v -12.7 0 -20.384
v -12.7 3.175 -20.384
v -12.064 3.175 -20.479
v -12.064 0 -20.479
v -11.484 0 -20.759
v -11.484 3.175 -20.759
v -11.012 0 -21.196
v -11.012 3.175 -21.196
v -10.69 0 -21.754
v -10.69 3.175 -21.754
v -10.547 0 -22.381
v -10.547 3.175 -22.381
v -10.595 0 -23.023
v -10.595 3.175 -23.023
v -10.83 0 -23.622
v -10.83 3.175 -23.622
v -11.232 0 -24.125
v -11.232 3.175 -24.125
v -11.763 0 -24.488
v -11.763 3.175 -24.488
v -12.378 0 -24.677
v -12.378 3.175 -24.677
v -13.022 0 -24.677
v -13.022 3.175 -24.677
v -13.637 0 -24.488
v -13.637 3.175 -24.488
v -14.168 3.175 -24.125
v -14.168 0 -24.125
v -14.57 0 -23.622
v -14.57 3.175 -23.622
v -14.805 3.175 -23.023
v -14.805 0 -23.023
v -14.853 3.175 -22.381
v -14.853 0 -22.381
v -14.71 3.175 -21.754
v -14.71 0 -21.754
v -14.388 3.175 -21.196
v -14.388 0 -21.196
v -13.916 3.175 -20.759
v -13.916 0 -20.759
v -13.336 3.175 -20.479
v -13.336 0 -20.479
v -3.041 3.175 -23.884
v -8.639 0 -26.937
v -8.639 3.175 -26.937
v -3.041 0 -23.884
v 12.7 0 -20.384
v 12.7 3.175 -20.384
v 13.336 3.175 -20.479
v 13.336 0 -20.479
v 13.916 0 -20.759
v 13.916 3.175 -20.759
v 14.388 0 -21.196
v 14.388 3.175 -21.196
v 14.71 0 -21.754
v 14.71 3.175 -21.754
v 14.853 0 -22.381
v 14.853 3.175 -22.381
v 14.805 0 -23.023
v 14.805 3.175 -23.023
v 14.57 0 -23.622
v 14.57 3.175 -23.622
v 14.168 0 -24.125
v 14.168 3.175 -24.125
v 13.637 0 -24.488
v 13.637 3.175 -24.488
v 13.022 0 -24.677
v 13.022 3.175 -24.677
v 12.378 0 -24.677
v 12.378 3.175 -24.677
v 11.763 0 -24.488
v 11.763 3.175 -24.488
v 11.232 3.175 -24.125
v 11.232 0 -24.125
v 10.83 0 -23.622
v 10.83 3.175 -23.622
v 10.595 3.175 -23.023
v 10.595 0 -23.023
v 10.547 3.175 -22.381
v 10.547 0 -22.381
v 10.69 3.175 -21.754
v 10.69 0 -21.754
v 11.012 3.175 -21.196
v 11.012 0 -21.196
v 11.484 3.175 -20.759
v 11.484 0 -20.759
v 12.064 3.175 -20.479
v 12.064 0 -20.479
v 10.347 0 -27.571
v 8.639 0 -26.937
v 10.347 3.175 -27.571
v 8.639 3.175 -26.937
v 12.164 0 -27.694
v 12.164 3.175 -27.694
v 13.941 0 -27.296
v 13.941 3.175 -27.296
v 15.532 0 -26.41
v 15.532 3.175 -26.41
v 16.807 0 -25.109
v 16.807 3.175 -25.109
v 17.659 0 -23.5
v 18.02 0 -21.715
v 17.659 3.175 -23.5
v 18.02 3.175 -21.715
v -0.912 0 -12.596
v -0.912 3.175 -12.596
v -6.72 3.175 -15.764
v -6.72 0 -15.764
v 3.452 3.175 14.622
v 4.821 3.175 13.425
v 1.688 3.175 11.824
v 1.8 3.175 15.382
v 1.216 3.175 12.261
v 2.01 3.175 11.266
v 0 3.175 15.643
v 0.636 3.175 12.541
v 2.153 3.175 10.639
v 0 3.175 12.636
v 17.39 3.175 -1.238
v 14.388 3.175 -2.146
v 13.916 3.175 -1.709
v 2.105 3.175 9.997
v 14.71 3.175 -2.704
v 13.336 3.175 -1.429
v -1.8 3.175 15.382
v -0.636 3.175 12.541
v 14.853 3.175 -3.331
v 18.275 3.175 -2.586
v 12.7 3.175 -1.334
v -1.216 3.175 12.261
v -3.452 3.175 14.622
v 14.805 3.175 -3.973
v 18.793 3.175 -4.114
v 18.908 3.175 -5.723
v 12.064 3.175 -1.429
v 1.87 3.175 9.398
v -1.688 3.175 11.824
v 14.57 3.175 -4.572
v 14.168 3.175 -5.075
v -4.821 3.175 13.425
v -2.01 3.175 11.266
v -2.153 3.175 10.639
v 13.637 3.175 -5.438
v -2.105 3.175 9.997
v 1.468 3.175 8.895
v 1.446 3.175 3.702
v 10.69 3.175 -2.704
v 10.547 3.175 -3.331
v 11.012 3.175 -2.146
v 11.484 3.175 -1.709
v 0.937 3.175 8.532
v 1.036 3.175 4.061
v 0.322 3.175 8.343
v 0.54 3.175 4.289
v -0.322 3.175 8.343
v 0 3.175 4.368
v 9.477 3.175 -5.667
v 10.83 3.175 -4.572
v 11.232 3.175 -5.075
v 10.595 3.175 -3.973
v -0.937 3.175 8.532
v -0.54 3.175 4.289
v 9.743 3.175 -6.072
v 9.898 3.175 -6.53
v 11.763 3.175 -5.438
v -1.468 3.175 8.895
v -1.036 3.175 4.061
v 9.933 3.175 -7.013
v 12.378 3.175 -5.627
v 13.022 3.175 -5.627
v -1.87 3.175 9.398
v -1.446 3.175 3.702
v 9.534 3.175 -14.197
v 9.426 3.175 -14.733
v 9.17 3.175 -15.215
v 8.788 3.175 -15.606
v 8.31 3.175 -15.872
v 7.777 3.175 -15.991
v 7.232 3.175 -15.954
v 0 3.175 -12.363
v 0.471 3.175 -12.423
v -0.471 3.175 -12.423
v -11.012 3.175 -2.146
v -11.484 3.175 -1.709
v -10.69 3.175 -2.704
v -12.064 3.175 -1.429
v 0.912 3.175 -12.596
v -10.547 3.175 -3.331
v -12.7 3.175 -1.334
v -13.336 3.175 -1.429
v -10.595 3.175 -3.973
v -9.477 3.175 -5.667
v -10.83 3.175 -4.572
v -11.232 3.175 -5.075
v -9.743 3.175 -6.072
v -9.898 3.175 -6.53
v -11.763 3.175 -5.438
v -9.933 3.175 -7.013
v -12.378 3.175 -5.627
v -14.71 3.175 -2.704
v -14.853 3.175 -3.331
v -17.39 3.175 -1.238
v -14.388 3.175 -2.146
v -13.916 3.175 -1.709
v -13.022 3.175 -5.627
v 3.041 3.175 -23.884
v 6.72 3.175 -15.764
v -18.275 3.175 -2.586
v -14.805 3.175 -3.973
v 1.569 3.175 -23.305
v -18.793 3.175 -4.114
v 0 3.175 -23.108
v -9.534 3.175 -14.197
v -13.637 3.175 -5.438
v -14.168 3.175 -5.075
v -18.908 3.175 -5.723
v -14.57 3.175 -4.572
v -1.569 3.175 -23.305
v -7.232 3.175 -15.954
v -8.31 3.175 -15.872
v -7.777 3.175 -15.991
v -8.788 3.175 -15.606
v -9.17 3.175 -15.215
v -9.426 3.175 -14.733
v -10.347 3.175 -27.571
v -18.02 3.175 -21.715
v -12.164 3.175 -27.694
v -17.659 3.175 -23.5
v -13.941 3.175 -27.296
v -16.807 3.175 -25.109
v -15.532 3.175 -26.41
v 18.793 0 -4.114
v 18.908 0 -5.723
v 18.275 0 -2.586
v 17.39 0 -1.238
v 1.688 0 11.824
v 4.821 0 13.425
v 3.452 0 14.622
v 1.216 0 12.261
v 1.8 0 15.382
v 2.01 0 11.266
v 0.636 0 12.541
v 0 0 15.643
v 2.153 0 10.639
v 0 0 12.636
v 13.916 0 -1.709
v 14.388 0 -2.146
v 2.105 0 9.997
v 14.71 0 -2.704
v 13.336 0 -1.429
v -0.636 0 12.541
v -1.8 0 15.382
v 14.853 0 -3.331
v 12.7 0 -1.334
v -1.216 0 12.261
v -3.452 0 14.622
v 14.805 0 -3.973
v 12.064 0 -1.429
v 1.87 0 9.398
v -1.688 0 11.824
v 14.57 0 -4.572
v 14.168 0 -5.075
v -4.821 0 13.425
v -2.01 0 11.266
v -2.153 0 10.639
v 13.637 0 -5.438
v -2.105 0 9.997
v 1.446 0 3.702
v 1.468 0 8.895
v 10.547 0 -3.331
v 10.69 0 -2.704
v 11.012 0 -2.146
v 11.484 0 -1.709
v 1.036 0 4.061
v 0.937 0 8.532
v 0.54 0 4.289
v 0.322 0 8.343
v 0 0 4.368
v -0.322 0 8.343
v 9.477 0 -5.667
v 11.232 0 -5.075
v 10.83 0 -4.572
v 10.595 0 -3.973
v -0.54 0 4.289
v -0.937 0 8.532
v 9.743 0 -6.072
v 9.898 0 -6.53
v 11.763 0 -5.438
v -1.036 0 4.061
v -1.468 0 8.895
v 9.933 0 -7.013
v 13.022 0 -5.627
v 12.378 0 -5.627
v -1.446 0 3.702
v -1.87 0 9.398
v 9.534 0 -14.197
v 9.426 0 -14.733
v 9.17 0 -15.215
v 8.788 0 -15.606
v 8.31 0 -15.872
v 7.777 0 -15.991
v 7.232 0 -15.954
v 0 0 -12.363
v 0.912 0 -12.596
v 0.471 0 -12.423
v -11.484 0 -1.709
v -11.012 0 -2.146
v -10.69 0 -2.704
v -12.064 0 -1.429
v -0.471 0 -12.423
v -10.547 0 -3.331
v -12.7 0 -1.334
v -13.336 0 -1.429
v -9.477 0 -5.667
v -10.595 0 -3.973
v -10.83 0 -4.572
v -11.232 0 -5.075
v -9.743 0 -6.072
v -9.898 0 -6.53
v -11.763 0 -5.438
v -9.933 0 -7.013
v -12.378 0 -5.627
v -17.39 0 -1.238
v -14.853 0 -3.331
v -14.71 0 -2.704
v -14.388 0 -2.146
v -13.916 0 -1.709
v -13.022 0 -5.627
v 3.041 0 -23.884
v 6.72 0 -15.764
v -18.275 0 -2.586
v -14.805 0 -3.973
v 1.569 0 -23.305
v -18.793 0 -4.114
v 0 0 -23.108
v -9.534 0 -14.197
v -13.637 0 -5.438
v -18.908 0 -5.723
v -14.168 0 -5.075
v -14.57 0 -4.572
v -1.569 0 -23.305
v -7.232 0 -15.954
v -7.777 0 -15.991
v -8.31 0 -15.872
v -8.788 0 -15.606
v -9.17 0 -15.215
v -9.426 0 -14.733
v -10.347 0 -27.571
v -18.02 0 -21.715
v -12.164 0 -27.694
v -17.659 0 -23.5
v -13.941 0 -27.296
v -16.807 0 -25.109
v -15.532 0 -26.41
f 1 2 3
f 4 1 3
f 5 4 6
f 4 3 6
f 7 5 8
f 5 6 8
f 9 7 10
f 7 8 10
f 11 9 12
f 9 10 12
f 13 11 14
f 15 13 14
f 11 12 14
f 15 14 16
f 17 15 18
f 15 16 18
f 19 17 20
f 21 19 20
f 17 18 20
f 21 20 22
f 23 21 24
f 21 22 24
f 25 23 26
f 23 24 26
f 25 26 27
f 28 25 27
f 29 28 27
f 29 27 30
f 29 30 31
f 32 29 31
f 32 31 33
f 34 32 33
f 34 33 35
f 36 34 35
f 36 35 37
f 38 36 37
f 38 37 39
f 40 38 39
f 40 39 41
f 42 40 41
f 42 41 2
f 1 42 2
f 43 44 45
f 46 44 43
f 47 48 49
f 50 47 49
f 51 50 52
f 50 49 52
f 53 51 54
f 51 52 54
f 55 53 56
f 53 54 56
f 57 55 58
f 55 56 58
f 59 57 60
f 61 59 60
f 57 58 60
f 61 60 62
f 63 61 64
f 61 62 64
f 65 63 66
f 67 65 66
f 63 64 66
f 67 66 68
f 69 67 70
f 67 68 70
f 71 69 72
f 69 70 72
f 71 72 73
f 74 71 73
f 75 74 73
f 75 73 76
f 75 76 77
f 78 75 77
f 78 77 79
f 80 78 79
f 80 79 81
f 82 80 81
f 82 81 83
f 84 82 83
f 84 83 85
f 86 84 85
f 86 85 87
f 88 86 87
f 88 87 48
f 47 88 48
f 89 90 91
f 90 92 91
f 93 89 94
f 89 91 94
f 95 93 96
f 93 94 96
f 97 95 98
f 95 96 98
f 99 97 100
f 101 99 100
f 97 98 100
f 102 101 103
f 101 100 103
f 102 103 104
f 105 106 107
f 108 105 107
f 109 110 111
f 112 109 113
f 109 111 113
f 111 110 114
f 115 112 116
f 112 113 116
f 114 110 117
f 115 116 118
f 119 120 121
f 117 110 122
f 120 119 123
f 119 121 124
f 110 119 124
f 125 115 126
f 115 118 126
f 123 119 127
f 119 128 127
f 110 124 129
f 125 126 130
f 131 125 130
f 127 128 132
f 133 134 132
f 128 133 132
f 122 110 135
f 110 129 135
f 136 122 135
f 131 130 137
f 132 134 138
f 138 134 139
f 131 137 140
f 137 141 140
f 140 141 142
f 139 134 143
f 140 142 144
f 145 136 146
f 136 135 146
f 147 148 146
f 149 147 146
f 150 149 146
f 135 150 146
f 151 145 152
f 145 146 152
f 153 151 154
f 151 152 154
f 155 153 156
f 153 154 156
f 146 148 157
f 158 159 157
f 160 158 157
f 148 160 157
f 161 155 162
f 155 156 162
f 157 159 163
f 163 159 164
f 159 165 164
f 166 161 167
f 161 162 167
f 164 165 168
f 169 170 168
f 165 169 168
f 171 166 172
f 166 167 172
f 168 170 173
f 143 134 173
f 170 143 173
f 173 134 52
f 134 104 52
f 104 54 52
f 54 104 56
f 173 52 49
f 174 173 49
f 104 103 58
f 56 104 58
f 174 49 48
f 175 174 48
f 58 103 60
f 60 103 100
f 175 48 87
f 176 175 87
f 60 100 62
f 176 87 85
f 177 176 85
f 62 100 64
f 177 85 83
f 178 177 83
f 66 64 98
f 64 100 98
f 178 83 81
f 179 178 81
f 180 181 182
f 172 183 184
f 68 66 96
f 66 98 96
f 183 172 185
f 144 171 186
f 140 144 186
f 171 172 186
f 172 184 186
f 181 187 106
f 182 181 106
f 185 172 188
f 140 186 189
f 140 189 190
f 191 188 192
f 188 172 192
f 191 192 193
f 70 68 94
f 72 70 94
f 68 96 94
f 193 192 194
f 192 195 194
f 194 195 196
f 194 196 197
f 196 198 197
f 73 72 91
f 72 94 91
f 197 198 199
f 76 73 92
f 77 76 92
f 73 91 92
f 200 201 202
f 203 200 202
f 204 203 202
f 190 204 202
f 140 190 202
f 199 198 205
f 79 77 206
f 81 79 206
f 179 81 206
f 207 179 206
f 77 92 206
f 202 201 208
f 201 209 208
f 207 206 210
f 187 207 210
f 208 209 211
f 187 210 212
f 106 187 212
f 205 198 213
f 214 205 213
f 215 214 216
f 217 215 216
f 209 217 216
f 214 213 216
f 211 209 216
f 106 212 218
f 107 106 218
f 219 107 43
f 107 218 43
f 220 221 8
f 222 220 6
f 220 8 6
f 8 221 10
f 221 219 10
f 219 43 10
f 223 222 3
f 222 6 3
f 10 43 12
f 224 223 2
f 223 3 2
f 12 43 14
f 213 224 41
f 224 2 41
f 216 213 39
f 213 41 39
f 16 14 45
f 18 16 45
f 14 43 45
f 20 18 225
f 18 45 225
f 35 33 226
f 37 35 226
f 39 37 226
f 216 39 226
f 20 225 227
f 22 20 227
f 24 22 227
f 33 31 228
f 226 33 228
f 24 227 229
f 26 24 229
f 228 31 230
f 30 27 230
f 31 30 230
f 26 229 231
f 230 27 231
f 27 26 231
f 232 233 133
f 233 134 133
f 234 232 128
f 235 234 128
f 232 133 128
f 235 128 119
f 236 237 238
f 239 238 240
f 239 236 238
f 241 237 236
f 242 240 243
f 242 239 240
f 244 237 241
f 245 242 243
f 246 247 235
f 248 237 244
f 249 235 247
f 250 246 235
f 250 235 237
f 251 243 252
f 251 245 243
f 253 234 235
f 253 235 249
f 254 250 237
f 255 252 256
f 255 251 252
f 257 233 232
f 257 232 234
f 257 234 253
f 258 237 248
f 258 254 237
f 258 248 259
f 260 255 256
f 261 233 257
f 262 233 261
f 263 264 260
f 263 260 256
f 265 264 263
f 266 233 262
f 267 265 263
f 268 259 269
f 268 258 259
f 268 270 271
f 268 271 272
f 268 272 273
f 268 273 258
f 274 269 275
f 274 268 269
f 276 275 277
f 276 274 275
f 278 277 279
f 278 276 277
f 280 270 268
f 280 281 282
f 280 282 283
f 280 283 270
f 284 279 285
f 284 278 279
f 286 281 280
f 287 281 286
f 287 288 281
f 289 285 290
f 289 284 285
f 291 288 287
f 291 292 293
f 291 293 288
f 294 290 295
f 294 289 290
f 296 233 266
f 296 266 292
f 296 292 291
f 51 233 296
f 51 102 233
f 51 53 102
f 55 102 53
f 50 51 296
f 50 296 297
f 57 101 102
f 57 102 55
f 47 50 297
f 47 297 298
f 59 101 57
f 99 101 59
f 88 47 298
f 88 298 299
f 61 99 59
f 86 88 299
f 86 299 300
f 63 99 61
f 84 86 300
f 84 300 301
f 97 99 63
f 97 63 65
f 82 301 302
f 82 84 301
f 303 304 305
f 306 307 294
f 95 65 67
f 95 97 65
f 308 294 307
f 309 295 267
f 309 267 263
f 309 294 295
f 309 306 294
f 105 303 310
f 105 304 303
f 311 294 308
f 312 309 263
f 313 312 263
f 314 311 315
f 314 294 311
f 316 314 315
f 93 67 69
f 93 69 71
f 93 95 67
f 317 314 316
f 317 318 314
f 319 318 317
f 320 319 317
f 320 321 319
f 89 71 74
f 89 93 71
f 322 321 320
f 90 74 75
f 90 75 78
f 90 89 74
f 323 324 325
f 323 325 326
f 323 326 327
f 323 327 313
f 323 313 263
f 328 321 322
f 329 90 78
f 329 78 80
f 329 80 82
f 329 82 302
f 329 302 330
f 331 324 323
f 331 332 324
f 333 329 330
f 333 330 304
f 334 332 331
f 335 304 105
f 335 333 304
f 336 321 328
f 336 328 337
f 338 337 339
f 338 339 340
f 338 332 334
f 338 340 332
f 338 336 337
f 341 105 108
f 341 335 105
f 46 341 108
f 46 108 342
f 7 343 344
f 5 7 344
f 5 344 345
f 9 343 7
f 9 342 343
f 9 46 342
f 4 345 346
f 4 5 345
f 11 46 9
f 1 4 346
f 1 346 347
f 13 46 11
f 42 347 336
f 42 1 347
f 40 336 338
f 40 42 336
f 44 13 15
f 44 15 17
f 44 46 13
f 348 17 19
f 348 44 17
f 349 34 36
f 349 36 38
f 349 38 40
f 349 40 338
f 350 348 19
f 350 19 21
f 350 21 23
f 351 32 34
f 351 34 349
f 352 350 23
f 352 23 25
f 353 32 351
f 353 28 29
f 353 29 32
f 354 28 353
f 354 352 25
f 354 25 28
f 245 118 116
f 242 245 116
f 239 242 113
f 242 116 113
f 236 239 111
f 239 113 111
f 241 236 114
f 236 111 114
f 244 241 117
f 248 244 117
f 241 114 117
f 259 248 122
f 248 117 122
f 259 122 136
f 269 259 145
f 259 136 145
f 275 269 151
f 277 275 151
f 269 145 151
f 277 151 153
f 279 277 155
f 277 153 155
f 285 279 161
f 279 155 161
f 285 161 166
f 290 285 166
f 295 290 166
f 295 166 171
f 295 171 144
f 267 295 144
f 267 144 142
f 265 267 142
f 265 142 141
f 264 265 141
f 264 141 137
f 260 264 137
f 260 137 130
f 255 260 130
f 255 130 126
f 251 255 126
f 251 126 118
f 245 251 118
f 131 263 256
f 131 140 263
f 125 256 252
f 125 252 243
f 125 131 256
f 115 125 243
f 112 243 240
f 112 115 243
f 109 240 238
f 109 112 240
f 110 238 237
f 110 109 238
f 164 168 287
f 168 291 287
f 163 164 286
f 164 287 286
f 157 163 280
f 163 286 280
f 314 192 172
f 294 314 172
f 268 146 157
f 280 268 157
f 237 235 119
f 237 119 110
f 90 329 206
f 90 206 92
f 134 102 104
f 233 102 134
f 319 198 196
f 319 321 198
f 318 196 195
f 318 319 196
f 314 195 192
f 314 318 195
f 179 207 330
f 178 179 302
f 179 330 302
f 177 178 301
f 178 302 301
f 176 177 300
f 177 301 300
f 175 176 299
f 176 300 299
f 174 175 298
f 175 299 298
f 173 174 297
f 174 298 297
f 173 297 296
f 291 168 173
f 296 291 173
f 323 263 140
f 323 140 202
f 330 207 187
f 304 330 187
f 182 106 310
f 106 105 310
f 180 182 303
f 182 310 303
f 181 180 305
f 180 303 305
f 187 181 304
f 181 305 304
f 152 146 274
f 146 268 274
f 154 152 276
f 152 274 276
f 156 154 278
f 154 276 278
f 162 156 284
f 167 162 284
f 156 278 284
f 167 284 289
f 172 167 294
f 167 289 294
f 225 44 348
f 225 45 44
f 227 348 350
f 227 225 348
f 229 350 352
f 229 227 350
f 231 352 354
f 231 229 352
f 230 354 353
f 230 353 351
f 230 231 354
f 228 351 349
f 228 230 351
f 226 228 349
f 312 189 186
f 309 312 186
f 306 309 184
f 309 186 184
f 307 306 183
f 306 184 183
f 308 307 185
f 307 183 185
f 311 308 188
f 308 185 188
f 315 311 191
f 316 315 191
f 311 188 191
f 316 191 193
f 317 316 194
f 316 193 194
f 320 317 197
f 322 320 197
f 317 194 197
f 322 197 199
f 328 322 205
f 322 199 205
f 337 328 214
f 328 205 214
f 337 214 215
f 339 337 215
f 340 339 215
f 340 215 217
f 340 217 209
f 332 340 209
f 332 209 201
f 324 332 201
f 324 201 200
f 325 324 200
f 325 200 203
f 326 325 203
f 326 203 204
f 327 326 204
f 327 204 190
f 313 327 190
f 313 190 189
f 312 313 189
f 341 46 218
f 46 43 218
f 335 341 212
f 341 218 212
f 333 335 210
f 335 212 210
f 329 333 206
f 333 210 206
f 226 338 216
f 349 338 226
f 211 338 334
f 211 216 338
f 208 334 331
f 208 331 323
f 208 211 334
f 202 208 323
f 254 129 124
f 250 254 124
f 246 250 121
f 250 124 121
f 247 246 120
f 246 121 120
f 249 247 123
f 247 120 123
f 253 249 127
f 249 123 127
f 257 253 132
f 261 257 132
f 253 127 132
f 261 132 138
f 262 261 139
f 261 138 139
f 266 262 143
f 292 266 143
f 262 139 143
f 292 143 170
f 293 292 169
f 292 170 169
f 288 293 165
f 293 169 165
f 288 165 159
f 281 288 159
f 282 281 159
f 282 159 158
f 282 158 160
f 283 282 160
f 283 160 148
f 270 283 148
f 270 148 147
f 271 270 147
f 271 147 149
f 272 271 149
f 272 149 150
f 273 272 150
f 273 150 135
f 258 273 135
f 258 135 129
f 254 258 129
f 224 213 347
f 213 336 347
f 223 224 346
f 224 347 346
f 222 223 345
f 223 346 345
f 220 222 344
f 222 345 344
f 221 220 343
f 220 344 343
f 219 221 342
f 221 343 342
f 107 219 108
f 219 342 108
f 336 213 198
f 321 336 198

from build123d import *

# Parameters (mm, degrees)
BOSS_EXTRUDE1_DEPTH = 3.175
SKETCH2_R           = 2.159
CUT_EXTRUDE1_DEPTH  = 38.162422217
CUT_EXTRUDE2_DEPTH  = 38.162422217
FILLET1_R           = 6.35
FILLET2_R           = 1.905


with BuildPart() as part:
    # Sketch1 → Boss-Extrude1 (new body)
    with BuildSketch(Plane(origin=(0, 0, 0), x_dir=(1, 0, 0), z_dir=(0, 1, 0))):
        Polygon((-17.4625, 31.75), (0, 22.225), (17.4625, 31.75), (19.05, 3.175), (0, -19.05), (-19.05, 3.175), align=None)
    extrude(amount=BOSS_EXTRUDE1_DEPTH)

    # Sketch2 → Cut-Extrude1 (cut, through all)
    with BuildSketch(Plane(origin=(0, 3.175, 0), x_dir=(1, 0, 0), z_dir=(0, 1, 0))):
        with Locations(Location((0, -10.4775, 0), (0, 0, 270))):
            Circle(SKETCH2_R)
        with Locations(Location((-12.7, 3.4925, 0), (0, 0, 270))):
            Circle(SKETCH2_R)
        with Locations(Location((12.7, 3.4925, 0), (0, 0, 270))):
            Circle(SKETCH2_R)
        with Locations(Location((-12.7, 22.5425, 0), (0, 0, 270))):
            Circle(SKETCH2_R)
        with Locations(Location((12.7, 22.5425, 0), (0, 0, 270))):
            Circle(SKETCH2_R)
    extrude(amount=-CUT_EXTRUDE1_DEPTH, mode=Mode.SUBTRACT)

    # Sketch3 → Cut-Extrude2 (cut, through all)
    with BuildSketch(Plane(origin=(0, 3.175, 0), x_dir=(1, 0, 0), z_dir=(0, 1, 0))):
        Polygon((-9.366701395, 17.207620695), (-9.975545431, 6.248428041), (0, -5.389708296), (9.975545431, 6.248428041), (9.366701395, 17.207620695), (0, 12.098510843), align=None)
    extrude(amount=-CUT_EXTRUDE2_DEPTH, mode=Mode.SUBTRACT)

    # Fillet1
    fillet1_edges = [part.edges().sort_by_distance(p)[0] for p in [
        (-17.4625, 1.5875, -31.75),
        (0, 1.5875, -22.225),
        (17.4625, 1.5875, -31.75),
        (19.05, 1.5875, -3.175),
        (0, 1.5875, 19.05),
        (-19.05, 1.5875, -3.175),
    ]]
    fillet(fillet1_edges, radius=FILLET1_R)

    # Fillet2
    fillet2_edges = [part.edges().sort_by_distance(p)[0] for p in [
        (-9.366701395, 1.5875, -17.207620695),
        (0, 1.5875, -12.098510843),
        (9.366701395, 1.5875, -17.207620695),
        (9.975545431, 1.5875, -6.248428041),
        (0, 1.5875, 5.389708296),
        (-9.975545431, 1.5875, -6.248428041),
    ]]
    fillet(fillet2_edges, radius=FILLET2_R)


solid = part.part
